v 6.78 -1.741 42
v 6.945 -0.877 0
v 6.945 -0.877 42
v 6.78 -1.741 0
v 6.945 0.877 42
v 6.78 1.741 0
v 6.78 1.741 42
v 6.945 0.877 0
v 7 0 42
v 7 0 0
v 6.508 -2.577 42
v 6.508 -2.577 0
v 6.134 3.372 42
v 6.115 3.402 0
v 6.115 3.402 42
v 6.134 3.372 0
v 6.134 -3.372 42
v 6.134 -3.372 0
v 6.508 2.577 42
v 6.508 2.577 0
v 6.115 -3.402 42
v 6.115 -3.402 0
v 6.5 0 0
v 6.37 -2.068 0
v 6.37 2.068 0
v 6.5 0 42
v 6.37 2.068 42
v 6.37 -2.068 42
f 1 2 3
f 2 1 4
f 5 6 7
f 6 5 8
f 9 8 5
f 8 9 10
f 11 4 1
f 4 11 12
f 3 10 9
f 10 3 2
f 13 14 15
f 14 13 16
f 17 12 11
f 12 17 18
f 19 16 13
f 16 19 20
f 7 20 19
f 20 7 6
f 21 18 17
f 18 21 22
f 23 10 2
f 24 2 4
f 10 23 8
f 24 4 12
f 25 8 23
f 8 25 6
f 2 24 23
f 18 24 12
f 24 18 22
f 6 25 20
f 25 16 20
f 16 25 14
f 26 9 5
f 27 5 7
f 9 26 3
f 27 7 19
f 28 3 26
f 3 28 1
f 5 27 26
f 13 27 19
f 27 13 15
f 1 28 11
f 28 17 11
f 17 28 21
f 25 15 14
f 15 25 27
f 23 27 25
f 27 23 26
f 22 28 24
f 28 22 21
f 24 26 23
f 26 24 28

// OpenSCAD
$fn = 50;


difference() {
	union() {
		cylinder(h = 42, r = 7.0000000000);
		translate(v = [-13.0000000000, 0, 0]) {
			cylinder(h = 42, r = 7.0000000000);
		}
	}
	union() {
		cylinder(h = 42, r = 3.2500000000);
		cylinder(h = 42, r = 1.8000000000);
		cylinder(h = 42, r = 1.8000000000);
		cylinder(h = 42, r = 1.8000000000);
		translate(v = [-17.5000000000, 0, 0]) {
			hull() {
				translate(v = [-3.7500000000, 0.0000000000, 0]) {
					cylinder(h = 42, r = 10.5000000000);
				}
				translate(v = [3.7500000000, 0.0000000000, 0]) {
					cylinder(h = 42, r = 10.5000000000);
				}
				translate(v = [-3.7500000000, -0.0000000000, 0]) {
					cylinder(h = 42, r = 10.5000000000);
				}
				translate(v = [3.7500000000, -0.0000000000, 0]) {
					cylinder(h = 42, r = 10.5000000000);
				}
			}
		}
		translate(v = [-10.0000000000, 0, 0.0000000000]) {
			cylinder(h = 42, r = 16.5000000000);
		}
	}
}
